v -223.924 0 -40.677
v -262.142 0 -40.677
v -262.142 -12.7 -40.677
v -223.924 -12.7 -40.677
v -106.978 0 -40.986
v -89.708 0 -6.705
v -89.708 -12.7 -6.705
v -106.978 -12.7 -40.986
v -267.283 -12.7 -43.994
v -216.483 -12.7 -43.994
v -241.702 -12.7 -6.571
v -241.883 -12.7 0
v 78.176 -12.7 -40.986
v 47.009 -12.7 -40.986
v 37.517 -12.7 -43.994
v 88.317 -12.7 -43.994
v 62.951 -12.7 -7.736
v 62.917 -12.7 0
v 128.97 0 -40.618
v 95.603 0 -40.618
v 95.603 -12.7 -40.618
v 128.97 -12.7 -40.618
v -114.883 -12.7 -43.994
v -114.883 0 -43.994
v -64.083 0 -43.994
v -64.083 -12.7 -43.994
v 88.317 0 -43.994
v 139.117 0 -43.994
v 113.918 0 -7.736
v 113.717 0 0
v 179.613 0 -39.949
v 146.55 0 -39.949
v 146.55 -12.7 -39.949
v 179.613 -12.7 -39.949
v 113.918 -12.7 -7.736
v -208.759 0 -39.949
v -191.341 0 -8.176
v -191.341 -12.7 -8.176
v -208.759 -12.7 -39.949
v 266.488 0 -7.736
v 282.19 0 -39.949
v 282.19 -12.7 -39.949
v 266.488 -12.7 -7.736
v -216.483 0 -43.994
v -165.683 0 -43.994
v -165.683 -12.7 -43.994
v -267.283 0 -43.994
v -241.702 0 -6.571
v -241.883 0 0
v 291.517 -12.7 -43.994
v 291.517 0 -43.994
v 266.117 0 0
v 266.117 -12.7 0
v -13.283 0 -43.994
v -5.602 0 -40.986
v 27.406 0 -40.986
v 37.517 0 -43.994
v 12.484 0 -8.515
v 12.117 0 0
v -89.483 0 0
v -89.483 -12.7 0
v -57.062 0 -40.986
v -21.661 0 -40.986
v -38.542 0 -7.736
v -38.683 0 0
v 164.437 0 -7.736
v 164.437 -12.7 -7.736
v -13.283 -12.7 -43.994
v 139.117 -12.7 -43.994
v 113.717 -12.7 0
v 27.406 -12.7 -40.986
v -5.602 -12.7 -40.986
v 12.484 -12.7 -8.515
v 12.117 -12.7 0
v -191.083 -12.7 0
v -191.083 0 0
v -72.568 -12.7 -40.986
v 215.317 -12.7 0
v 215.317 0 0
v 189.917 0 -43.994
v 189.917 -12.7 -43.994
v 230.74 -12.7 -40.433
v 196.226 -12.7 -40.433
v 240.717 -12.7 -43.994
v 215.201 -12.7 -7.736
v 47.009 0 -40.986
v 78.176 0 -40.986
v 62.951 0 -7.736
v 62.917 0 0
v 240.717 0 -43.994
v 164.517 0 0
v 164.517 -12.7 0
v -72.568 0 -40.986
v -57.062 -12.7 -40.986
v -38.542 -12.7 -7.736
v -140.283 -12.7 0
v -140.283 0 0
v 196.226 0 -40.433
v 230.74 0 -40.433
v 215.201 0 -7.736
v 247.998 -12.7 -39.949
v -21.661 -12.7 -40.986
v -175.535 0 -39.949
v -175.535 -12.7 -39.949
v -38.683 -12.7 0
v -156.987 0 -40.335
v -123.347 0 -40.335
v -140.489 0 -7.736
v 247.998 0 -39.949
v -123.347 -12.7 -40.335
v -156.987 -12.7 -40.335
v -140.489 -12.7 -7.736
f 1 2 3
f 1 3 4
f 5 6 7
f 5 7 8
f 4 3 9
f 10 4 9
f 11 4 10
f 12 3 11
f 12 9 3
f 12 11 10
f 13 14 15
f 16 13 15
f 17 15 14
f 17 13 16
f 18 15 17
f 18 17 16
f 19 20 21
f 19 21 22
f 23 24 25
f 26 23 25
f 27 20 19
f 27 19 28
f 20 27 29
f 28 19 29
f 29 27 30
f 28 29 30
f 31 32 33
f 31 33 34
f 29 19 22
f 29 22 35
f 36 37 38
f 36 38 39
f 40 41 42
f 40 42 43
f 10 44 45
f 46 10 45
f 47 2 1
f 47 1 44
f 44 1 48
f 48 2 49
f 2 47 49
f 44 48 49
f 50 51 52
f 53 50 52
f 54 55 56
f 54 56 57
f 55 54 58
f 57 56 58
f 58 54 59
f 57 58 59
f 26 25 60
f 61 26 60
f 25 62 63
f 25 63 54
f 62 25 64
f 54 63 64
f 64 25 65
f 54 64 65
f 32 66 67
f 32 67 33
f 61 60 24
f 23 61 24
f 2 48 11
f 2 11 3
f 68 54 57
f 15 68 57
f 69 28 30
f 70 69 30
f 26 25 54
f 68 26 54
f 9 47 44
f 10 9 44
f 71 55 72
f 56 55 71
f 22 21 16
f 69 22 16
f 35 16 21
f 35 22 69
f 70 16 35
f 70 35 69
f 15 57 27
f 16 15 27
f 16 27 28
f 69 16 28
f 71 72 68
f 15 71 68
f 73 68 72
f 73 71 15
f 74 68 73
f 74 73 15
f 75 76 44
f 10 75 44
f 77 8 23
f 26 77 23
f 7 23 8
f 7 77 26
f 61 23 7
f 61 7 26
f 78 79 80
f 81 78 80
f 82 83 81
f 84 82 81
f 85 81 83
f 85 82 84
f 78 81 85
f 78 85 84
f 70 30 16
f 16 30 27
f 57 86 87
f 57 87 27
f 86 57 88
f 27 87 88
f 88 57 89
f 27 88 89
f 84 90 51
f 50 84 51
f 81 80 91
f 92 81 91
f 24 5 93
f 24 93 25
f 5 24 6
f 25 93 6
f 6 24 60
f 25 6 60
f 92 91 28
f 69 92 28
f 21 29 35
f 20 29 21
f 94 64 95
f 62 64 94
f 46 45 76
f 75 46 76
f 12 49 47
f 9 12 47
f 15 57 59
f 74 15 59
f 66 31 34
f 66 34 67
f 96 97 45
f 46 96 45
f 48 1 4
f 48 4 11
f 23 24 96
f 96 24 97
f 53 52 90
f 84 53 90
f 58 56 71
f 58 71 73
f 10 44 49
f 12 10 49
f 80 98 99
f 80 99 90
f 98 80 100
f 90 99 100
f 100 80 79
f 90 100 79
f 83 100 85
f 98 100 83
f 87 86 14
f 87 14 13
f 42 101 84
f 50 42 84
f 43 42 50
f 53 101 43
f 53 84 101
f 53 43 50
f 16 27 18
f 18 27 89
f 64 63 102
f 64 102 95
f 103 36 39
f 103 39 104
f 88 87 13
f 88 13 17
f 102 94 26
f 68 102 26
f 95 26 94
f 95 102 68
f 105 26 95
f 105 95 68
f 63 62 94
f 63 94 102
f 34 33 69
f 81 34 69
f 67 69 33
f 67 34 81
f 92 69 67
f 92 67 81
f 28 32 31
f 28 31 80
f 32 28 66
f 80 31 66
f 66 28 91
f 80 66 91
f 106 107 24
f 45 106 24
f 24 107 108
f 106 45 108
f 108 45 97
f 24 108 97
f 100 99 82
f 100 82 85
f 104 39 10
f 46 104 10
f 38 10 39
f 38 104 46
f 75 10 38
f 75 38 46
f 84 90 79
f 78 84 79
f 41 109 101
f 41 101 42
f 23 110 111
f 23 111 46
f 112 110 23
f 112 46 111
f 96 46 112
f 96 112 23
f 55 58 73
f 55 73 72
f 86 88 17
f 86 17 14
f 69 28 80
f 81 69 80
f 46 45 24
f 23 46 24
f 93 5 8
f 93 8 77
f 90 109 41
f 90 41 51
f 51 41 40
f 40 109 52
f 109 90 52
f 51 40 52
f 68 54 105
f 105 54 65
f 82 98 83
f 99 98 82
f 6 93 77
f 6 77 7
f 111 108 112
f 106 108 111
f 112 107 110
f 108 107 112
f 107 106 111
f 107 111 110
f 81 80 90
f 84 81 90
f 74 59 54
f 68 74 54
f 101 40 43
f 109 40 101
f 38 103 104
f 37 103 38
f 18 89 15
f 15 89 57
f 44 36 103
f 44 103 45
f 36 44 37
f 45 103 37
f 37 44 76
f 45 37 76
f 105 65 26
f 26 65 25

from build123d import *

# Parameters (mm, degrees)
F1_DEPTH = 12.7
F3_DEPTH = 12.7
F5_DEPTH = 12.7


with BuildPart() as f1:
    # F0 (on Front) → F1 (new body)
    with BuildSketch(Plane.XZ):
        Polygon((-241.883262, 0), (-267.283262, -43.994091), (-216.483262, -43.994091), align=None)
        Polygon((266.116738, 0), (240.716738, -43.994091), (291.516738, -43.994091), align=None)
        Polygon((215.316738, 0), (189.916738, -43.994091), (240.716738, -43.994091), align=None)
        Polygon((164.516738, 0), (139.116738, -43.994091), (189.916738, -43.994091), align=None)
        Polygon((113.716738, 0), (88.316738, -43.994091), (139.116738, -43.994091), align=None)
        Polygon((62.916738, 0), (37.516738, -43.994091), (88.316738, -43.994091), align=None)
        Polygon((12.116738, 0), (-13.283262, -43.994091), (37.516738, -43.994091), align=None)
        Polygon((-38.683262, 0), (-64.083262, -43.994091), (-13.283262, -43.994091), align=None)
        Polygon((-89.483262, 0), (-114.883262, -43.994091), (-64.083262, -43.994091), align=None)
        Polygon((-140.283262, 0), (-165.683262, -43.994091), (-114.883262, -43.994091), align=None)
        Polygon((-191.083262, 0), (-216.483262, -43.994091), (-165.683262, -43.994091), align=None)
    extrude(amount=F1_DEPTH)

    # F2 (on Front) → F3 (cut)
    with BuildSketch(Plane.XZ):
        Polygon((-223.923534, -40.677357), (-241.702169, -6.571393), (-262.141556, -40.677357), align=None)
    extrude(amount=F3_DEPTH, mode=Mode.SUBTRACT)

    # F4 (on Front) → F5 (cut)
    with BuildSketch(Plane.XZ):
        Polygon((-175.534889, -39.949007), (-191.340759, -8.175986), (-208.759472, -39.949007), align=None)
        Polygon((-123.346582, -40.334888), (-140.488886, -7.735887), (-156.98719, -40.334888), align=None)
        Polygon((-72.567524, -40.986173), (-89.708172, -6.704872), (-106.977701, -40.986173), align=None)
        Polygon((-21.661077, -40.986173), (-38.541994, -7.735887), (-57.062074, -40.986173), align=None)
        Polygon((27.406325, -40.986173), (12.483668, -8.515121), (-5.602386, -40.986173), align=None)
        Polygon((78.176022, -40.986173), (62.950893, -7.735887), (47.008931, -40.986173), align=None)
        Polygon((128.970012, -40.617937), (113.917604, -7.735887), (95.602627, -40.617937), align=None)
        Polygon((179.613307, -39.949007), (164.437413, -7.735887), (146.550015, -39.949007), align=None)
        Polygon((230.740458, -40.432863), (215.201312, -7.735887), (196.225598, -40.432863), align=None)
        Polygon((282.190174, -39.949007), (266.488305, -7.735887), (247.997895, -39.949007), align=None)
    extrude(amount=F5_DEPTH, mode=Mode.SUBTRACT)


solid = f1.part
